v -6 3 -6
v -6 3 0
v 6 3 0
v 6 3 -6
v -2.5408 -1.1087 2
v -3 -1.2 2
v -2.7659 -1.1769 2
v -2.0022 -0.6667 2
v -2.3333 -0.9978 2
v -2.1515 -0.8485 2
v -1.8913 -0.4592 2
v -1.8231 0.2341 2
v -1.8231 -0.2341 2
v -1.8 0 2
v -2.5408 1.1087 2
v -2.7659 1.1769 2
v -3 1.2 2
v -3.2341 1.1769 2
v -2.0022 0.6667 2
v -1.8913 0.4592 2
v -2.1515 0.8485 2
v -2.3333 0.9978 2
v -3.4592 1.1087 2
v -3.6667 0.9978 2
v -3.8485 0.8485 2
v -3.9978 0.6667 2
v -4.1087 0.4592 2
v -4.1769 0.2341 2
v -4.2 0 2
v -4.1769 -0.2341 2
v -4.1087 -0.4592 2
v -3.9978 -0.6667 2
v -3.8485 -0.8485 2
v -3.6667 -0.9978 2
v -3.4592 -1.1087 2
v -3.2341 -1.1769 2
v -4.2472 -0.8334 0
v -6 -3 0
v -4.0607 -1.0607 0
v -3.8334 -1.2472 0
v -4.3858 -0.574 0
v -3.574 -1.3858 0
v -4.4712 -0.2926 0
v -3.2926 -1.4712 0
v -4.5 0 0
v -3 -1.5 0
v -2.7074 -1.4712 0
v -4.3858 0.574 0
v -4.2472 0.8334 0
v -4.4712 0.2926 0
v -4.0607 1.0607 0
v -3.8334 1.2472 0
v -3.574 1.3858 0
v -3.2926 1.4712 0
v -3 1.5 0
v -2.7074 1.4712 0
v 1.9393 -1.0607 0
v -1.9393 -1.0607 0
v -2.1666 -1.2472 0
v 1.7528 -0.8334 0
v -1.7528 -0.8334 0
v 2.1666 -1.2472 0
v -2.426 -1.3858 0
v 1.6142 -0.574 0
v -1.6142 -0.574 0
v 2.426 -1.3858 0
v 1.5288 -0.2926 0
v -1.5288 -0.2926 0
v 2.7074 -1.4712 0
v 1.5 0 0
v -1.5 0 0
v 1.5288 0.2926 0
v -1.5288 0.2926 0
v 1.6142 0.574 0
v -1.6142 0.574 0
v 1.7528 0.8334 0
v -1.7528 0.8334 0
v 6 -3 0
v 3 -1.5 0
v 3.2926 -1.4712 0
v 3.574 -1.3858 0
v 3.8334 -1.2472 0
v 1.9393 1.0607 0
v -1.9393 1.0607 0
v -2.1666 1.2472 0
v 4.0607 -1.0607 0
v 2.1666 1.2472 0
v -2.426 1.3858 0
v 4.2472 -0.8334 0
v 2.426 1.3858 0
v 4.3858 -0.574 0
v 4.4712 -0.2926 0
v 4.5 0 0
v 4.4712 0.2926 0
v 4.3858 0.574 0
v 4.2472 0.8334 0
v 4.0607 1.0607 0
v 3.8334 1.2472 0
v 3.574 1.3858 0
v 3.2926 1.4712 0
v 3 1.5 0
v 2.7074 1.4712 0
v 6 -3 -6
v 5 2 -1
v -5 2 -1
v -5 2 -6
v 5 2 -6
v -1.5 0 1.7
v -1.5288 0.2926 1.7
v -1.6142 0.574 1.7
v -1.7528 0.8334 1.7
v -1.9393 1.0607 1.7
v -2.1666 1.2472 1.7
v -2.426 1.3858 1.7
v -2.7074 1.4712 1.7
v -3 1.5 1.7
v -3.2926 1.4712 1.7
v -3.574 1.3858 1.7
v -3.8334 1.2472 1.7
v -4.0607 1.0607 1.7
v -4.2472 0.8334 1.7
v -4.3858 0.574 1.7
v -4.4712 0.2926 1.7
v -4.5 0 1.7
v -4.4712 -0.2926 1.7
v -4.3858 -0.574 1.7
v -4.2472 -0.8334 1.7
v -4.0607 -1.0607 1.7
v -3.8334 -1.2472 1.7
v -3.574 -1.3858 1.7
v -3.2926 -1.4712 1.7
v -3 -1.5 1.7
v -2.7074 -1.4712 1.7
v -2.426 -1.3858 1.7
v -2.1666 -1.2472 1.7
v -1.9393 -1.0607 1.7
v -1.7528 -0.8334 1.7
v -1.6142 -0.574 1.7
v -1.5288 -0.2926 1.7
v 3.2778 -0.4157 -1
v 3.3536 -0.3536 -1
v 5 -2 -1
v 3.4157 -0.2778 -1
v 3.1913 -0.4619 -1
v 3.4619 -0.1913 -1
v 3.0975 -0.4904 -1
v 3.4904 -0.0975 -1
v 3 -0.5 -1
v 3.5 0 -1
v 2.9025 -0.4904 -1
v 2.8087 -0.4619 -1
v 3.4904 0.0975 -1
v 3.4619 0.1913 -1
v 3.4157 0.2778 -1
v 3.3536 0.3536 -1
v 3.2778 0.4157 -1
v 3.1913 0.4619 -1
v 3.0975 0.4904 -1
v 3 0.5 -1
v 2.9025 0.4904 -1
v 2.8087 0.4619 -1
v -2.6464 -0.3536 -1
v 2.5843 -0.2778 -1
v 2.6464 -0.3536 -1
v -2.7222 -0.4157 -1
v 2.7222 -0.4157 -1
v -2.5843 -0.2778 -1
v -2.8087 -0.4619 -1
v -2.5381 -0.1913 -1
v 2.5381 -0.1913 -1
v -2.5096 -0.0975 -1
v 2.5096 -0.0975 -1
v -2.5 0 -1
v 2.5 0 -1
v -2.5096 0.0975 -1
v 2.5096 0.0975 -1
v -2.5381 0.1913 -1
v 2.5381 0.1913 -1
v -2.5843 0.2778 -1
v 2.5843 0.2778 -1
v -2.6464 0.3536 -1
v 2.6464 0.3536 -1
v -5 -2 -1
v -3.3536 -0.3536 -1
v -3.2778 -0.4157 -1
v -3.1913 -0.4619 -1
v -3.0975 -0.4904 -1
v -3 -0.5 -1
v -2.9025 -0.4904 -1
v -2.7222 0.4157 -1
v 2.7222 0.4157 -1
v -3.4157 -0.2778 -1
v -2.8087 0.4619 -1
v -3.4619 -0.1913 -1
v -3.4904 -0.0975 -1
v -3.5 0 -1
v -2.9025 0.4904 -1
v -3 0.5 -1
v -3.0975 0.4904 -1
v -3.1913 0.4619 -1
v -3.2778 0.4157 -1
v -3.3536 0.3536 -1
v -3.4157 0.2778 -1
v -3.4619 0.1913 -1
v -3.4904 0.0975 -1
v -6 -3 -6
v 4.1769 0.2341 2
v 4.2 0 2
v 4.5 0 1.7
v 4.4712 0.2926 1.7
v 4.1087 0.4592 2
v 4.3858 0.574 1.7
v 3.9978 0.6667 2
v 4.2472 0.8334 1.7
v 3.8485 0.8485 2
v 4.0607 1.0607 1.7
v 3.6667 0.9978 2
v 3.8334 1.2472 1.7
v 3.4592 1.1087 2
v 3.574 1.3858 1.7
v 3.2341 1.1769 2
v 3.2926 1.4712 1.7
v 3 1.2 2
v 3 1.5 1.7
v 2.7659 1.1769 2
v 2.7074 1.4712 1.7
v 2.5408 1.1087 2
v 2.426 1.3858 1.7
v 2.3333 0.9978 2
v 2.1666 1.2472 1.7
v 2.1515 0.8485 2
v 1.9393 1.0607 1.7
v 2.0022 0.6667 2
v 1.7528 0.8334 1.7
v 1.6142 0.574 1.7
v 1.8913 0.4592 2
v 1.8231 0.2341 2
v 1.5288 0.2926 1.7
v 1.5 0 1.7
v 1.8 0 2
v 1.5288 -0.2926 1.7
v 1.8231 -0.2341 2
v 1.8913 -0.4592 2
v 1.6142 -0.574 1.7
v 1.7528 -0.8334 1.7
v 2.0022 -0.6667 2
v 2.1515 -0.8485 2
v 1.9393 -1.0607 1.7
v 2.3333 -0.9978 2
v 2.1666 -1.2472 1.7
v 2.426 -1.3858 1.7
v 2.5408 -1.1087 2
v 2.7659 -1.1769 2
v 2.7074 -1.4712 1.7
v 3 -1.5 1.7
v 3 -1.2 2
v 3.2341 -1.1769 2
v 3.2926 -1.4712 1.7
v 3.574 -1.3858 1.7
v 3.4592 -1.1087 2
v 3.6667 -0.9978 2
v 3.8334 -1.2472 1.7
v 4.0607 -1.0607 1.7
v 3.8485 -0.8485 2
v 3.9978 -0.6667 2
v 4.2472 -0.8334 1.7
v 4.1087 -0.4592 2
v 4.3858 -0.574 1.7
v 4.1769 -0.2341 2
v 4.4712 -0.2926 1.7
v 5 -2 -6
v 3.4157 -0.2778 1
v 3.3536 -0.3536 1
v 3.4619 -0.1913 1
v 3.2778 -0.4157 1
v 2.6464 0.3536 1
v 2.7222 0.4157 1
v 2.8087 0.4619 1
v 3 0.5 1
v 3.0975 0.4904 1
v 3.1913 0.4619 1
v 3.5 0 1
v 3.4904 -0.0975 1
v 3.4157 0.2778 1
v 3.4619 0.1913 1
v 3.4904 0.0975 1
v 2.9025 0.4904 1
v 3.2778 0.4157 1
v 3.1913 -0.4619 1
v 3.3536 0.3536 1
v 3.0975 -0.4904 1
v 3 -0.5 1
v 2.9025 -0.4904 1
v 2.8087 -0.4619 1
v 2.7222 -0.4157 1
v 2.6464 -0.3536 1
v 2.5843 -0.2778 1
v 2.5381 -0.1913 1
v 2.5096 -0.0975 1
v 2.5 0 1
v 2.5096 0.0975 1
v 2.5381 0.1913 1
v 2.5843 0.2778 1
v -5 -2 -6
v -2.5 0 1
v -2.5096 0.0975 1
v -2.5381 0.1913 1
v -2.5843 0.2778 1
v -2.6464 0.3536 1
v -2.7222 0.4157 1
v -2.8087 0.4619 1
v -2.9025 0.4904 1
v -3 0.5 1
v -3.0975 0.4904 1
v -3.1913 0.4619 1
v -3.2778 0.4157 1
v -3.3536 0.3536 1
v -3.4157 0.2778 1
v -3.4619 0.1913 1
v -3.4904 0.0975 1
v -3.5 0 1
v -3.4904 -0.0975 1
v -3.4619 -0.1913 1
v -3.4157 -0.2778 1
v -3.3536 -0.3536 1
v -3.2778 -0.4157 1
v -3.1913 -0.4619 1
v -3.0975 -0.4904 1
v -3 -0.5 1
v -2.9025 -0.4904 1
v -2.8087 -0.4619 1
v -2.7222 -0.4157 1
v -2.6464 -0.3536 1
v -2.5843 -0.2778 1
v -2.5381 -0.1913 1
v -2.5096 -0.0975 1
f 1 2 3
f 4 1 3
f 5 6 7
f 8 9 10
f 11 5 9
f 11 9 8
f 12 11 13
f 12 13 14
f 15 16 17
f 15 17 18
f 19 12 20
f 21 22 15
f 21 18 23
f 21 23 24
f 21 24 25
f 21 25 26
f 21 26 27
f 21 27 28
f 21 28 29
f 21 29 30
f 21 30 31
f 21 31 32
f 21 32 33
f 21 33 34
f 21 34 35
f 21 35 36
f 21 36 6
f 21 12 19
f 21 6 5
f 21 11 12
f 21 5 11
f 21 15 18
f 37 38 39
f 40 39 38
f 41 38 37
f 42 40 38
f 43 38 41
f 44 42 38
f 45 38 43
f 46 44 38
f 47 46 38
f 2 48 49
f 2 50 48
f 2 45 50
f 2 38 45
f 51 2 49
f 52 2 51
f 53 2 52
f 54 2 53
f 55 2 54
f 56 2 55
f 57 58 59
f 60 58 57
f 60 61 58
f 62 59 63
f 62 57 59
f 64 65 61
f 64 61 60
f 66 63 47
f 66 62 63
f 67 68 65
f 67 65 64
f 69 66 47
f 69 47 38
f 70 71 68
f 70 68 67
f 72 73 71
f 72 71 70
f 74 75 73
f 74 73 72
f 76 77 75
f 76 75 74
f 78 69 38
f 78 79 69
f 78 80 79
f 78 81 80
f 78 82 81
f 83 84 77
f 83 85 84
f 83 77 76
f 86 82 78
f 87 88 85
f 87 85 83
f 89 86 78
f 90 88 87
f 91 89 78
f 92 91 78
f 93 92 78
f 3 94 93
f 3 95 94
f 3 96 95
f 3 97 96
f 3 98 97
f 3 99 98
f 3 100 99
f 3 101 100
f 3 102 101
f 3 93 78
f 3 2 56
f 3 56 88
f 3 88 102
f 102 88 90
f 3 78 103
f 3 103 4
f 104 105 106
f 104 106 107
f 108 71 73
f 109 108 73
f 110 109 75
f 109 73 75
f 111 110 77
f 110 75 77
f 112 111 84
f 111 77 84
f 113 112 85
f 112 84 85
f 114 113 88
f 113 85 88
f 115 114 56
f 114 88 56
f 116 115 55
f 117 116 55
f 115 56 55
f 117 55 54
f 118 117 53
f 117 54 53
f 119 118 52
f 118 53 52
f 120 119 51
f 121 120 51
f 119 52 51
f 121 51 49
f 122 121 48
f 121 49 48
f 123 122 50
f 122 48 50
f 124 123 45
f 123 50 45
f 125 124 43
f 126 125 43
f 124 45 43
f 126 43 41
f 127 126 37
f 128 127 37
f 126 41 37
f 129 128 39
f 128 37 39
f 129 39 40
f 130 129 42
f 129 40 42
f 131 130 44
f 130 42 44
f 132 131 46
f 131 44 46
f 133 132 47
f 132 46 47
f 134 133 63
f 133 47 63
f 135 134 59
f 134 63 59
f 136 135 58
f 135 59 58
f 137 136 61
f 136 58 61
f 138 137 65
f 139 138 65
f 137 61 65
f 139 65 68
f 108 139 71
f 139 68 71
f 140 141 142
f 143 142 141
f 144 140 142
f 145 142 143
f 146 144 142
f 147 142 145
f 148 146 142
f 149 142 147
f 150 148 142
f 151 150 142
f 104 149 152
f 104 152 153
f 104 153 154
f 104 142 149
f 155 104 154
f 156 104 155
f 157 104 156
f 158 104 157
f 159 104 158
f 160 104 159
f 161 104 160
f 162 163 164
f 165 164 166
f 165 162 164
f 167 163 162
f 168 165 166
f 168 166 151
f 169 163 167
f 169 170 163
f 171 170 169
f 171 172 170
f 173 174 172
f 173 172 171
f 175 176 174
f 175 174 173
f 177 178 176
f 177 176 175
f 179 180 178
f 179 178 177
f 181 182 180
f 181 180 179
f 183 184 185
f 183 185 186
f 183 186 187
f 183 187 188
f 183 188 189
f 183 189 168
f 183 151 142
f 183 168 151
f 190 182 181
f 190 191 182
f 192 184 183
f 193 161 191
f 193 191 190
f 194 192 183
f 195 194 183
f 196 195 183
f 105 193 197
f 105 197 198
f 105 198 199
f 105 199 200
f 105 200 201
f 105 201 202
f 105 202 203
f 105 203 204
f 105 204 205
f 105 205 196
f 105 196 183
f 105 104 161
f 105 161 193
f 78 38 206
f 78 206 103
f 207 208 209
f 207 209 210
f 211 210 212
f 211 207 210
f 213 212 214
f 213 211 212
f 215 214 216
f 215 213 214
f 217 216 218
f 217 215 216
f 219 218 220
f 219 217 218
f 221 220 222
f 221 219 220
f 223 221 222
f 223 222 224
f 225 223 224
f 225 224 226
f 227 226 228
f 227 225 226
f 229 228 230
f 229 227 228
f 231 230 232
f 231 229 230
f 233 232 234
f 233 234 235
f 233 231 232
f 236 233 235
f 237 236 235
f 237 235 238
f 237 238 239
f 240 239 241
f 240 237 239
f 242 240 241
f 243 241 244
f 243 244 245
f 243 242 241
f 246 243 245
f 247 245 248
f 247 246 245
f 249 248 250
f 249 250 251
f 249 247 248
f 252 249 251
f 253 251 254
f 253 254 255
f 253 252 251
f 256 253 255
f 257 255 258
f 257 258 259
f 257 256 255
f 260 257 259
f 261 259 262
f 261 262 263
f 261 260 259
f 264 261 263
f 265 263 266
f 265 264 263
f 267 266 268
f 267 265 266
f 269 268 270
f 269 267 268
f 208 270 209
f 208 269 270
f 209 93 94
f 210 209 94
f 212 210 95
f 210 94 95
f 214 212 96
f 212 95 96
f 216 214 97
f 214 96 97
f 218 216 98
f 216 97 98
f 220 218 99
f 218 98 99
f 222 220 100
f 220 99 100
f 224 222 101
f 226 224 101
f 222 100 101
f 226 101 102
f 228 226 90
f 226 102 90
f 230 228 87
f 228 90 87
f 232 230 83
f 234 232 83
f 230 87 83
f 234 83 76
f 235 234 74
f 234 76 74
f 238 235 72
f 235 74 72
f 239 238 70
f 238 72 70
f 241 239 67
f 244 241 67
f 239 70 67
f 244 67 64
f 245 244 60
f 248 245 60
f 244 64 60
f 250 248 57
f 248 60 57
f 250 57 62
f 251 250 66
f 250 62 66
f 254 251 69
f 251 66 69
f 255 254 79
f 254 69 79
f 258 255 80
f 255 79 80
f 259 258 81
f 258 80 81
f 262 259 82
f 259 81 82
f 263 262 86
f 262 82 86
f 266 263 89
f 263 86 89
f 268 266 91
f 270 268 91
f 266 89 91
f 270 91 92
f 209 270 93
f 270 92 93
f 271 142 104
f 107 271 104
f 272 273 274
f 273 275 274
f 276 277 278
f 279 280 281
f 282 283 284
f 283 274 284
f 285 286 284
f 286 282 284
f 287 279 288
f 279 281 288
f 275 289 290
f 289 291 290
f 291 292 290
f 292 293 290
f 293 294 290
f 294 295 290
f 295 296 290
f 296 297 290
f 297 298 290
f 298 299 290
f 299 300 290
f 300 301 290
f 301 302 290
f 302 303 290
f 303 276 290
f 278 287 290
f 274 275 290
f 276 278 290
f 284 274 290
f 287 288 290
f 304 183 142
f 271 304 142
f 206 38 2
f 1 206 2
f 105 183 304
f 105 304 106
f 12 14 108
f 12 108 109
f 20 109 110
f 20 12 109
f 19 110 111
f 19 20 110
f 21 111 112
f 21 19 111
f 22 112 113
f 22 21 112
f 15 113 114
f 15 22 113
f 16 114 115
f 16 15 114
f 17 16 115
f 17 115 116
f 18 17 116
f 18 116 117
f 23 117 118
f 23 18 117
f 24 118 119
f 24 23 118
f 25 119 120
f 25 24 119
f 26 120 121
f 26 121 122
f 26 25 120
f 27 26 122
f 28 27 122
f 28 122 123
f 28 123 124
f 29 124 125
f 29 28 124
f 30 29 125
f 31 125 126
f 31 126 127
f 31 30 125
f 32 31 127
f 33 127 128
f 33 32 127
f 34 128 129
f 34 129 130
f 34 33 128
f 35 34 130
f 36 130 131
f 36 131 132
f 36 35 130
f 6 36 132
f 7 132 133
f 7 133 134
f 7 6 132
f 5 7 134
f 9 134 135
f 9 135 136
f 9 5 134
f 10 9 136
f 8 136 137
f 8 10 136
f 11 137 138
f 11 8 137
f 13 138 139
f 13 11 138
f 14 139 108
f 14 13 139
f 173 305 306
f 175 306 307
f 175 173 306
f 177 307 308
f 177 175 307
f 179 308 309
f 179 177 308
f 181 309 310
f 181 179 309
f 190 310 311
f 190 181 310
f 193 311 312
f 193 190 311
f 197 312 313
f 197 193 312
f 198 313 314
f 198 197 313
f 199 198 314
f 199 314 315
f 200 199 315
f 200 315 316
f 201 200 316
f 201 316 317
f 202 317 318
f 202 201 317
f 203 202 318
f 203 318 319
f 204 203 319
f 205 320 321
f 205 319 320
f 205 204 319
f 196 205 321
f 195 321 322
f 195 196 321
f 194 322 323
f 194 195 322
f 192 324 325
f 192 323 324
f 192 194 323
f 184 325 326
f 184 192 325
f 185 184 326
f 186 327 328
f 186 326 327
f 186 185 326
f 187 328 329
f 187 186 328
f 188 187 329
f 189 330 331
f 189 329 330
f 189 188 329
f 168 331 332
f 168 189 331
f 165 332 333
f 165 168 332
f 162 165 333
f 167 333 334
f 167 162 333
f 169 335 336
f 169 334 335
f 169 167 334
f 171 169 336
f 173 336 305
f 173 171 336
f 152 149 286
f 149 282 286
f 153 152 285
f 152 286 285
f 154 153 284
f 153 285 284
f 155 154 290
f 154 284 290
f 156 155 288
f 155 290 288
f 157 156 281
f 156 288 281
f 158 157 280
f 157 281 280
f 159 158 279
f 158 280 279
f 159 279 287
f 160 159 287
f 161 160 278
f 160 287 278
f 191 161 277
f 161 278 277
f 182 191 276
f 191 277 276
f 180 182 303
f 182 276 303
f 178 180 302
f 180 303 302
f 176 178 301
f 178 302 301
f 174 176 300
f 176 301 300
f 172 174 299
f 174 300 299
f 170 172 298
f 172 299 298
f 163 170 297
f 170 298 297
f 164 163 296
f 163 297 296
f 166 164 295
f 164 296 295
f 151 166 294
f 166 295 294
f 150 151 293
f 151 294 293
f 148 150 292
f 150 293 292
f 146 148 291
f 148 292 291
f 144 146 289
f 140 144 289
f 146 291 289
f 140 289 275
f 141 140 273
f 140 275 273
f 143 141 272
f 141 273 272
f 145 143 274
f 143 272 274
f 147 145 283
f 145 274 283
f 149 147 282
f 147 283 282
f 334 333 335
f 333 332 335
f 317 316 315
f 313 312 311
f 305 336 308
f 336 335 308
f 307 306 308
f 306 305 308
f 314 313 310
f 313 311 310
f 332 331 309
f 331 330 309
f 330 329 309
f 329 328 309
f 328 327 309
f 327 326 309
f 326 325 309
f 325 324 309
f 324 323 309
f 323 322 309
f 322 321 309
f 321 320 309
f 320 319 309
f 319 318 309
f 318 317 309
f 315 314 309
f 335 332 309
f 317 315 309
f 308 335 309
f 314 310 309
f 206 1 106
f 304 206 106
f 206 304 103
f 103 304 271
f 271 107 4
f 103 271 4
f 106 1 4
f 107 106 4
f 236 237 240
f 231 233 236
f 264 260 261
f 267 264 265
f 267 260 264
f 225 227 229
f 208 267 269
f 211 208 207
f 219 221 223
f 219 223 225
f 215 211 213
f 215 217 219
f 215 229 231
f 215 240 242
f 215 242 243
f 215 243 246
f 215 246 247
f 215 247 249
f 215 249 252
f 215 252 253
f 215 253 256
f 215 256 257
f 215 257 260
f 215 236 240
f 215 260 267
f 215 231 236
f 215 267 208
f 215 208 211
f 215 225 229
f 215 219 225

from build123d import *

# Parameters (mm, degrees)
F3_W     = 12
F3_H     = 6
F0_DEPTH = 6.0000000522
F1_R     = 1.5
F4_DEPTH = 2
F5_SIZE  = 0.3
F2_T     = 1


# Not quite as in the source:
# - a shell that OpenCascade refuses in one call is made with other operations: the cavity is built on its own and cut out


with BuildPart() as f0:
    # F3 (on Top) → F0 (new body)
    with BuildSketch(Plane.XY):
        Rectangle(F3_W, F3_H)
    extrude(amount=-F0_DEPTH)

    # F1 (on Top) → F4 (join)
    with BuildSketch(Plane.XY):
        with Locations((3, 0)):
            Circle(F1_R)
        with Locations((-3, 0)):
            Circle(F1_R)
    extrude(amount=F4_DEPTH)

    # F5
    f5_edges = [f0.edges().sort_by_distance(p)[0] for p in [
        (-4.5, 0, 2),
        (1.5, 0, 2),
    ]]
    chamfer(f5_edges, length=F5_SIZE)

    # F2: shell of thickness 1, made by hand


with BuildPart() as f2_core1:
    # F2_t2: copy of F0
    add(f0.part)

    # the walls: a layer under each face that stays
    f2_faces = [f2_core1.faces().sort_by_distance(p)[0] for p in [
        (-4.5, 0, 0.85),
        (-4.35, 0, 1.85),
        (0, 0, 0),
        (-3, 0, 2),
        (0, 3, -3.0000000261),
        (6, 0, -3.0000000261),
        (-6, 0, -3.0000000261),
        (0, -3, -3.0000000261),
        (1.5, 0, 0.85),
        (1.65, 0, 1.85),
        (3, 0, 2),
    ]]
    thicken(f2_faces, amount=-F2_T, mode=Mode.SUBTRACT)

    # F2_s3 → F2_t4 (revolve, cut)
    with BuildSketch(Plane.XZ):
        Polygon((-1.49, 0.01), (-2.5, 0), (-2.5, -1), (-1.5, -1), align=None)
    revolve(axis=Axis((-3, 0, 0), (0, 0, 1)), mode=Mode.SUBTRACT)

    # F2_s5 → F2_t6 (revolve, cut)
    with BuildSketch(Plane.XZ):
        Polygon((4.51, 0.01), (4.5, -1), (3.5, -1), (3.5, 0), align=None)
    revolve(axis=Axis((3, 0, 0), (0, 0, 1)), mode=Mode.SUBTRACT)


with BuildPart() as f0_1:
    add(f0.part)

    # what is left inside the walls is the cavity
    f2_cavity = [f2_core1.part.solids().sort_by_distance(p)[0] for p in [
        (0, 1.99, -4.333333),
    ]]
    add(f2_cavity, mode=Mode.SUBTRACT)


solid = f0_1.part
